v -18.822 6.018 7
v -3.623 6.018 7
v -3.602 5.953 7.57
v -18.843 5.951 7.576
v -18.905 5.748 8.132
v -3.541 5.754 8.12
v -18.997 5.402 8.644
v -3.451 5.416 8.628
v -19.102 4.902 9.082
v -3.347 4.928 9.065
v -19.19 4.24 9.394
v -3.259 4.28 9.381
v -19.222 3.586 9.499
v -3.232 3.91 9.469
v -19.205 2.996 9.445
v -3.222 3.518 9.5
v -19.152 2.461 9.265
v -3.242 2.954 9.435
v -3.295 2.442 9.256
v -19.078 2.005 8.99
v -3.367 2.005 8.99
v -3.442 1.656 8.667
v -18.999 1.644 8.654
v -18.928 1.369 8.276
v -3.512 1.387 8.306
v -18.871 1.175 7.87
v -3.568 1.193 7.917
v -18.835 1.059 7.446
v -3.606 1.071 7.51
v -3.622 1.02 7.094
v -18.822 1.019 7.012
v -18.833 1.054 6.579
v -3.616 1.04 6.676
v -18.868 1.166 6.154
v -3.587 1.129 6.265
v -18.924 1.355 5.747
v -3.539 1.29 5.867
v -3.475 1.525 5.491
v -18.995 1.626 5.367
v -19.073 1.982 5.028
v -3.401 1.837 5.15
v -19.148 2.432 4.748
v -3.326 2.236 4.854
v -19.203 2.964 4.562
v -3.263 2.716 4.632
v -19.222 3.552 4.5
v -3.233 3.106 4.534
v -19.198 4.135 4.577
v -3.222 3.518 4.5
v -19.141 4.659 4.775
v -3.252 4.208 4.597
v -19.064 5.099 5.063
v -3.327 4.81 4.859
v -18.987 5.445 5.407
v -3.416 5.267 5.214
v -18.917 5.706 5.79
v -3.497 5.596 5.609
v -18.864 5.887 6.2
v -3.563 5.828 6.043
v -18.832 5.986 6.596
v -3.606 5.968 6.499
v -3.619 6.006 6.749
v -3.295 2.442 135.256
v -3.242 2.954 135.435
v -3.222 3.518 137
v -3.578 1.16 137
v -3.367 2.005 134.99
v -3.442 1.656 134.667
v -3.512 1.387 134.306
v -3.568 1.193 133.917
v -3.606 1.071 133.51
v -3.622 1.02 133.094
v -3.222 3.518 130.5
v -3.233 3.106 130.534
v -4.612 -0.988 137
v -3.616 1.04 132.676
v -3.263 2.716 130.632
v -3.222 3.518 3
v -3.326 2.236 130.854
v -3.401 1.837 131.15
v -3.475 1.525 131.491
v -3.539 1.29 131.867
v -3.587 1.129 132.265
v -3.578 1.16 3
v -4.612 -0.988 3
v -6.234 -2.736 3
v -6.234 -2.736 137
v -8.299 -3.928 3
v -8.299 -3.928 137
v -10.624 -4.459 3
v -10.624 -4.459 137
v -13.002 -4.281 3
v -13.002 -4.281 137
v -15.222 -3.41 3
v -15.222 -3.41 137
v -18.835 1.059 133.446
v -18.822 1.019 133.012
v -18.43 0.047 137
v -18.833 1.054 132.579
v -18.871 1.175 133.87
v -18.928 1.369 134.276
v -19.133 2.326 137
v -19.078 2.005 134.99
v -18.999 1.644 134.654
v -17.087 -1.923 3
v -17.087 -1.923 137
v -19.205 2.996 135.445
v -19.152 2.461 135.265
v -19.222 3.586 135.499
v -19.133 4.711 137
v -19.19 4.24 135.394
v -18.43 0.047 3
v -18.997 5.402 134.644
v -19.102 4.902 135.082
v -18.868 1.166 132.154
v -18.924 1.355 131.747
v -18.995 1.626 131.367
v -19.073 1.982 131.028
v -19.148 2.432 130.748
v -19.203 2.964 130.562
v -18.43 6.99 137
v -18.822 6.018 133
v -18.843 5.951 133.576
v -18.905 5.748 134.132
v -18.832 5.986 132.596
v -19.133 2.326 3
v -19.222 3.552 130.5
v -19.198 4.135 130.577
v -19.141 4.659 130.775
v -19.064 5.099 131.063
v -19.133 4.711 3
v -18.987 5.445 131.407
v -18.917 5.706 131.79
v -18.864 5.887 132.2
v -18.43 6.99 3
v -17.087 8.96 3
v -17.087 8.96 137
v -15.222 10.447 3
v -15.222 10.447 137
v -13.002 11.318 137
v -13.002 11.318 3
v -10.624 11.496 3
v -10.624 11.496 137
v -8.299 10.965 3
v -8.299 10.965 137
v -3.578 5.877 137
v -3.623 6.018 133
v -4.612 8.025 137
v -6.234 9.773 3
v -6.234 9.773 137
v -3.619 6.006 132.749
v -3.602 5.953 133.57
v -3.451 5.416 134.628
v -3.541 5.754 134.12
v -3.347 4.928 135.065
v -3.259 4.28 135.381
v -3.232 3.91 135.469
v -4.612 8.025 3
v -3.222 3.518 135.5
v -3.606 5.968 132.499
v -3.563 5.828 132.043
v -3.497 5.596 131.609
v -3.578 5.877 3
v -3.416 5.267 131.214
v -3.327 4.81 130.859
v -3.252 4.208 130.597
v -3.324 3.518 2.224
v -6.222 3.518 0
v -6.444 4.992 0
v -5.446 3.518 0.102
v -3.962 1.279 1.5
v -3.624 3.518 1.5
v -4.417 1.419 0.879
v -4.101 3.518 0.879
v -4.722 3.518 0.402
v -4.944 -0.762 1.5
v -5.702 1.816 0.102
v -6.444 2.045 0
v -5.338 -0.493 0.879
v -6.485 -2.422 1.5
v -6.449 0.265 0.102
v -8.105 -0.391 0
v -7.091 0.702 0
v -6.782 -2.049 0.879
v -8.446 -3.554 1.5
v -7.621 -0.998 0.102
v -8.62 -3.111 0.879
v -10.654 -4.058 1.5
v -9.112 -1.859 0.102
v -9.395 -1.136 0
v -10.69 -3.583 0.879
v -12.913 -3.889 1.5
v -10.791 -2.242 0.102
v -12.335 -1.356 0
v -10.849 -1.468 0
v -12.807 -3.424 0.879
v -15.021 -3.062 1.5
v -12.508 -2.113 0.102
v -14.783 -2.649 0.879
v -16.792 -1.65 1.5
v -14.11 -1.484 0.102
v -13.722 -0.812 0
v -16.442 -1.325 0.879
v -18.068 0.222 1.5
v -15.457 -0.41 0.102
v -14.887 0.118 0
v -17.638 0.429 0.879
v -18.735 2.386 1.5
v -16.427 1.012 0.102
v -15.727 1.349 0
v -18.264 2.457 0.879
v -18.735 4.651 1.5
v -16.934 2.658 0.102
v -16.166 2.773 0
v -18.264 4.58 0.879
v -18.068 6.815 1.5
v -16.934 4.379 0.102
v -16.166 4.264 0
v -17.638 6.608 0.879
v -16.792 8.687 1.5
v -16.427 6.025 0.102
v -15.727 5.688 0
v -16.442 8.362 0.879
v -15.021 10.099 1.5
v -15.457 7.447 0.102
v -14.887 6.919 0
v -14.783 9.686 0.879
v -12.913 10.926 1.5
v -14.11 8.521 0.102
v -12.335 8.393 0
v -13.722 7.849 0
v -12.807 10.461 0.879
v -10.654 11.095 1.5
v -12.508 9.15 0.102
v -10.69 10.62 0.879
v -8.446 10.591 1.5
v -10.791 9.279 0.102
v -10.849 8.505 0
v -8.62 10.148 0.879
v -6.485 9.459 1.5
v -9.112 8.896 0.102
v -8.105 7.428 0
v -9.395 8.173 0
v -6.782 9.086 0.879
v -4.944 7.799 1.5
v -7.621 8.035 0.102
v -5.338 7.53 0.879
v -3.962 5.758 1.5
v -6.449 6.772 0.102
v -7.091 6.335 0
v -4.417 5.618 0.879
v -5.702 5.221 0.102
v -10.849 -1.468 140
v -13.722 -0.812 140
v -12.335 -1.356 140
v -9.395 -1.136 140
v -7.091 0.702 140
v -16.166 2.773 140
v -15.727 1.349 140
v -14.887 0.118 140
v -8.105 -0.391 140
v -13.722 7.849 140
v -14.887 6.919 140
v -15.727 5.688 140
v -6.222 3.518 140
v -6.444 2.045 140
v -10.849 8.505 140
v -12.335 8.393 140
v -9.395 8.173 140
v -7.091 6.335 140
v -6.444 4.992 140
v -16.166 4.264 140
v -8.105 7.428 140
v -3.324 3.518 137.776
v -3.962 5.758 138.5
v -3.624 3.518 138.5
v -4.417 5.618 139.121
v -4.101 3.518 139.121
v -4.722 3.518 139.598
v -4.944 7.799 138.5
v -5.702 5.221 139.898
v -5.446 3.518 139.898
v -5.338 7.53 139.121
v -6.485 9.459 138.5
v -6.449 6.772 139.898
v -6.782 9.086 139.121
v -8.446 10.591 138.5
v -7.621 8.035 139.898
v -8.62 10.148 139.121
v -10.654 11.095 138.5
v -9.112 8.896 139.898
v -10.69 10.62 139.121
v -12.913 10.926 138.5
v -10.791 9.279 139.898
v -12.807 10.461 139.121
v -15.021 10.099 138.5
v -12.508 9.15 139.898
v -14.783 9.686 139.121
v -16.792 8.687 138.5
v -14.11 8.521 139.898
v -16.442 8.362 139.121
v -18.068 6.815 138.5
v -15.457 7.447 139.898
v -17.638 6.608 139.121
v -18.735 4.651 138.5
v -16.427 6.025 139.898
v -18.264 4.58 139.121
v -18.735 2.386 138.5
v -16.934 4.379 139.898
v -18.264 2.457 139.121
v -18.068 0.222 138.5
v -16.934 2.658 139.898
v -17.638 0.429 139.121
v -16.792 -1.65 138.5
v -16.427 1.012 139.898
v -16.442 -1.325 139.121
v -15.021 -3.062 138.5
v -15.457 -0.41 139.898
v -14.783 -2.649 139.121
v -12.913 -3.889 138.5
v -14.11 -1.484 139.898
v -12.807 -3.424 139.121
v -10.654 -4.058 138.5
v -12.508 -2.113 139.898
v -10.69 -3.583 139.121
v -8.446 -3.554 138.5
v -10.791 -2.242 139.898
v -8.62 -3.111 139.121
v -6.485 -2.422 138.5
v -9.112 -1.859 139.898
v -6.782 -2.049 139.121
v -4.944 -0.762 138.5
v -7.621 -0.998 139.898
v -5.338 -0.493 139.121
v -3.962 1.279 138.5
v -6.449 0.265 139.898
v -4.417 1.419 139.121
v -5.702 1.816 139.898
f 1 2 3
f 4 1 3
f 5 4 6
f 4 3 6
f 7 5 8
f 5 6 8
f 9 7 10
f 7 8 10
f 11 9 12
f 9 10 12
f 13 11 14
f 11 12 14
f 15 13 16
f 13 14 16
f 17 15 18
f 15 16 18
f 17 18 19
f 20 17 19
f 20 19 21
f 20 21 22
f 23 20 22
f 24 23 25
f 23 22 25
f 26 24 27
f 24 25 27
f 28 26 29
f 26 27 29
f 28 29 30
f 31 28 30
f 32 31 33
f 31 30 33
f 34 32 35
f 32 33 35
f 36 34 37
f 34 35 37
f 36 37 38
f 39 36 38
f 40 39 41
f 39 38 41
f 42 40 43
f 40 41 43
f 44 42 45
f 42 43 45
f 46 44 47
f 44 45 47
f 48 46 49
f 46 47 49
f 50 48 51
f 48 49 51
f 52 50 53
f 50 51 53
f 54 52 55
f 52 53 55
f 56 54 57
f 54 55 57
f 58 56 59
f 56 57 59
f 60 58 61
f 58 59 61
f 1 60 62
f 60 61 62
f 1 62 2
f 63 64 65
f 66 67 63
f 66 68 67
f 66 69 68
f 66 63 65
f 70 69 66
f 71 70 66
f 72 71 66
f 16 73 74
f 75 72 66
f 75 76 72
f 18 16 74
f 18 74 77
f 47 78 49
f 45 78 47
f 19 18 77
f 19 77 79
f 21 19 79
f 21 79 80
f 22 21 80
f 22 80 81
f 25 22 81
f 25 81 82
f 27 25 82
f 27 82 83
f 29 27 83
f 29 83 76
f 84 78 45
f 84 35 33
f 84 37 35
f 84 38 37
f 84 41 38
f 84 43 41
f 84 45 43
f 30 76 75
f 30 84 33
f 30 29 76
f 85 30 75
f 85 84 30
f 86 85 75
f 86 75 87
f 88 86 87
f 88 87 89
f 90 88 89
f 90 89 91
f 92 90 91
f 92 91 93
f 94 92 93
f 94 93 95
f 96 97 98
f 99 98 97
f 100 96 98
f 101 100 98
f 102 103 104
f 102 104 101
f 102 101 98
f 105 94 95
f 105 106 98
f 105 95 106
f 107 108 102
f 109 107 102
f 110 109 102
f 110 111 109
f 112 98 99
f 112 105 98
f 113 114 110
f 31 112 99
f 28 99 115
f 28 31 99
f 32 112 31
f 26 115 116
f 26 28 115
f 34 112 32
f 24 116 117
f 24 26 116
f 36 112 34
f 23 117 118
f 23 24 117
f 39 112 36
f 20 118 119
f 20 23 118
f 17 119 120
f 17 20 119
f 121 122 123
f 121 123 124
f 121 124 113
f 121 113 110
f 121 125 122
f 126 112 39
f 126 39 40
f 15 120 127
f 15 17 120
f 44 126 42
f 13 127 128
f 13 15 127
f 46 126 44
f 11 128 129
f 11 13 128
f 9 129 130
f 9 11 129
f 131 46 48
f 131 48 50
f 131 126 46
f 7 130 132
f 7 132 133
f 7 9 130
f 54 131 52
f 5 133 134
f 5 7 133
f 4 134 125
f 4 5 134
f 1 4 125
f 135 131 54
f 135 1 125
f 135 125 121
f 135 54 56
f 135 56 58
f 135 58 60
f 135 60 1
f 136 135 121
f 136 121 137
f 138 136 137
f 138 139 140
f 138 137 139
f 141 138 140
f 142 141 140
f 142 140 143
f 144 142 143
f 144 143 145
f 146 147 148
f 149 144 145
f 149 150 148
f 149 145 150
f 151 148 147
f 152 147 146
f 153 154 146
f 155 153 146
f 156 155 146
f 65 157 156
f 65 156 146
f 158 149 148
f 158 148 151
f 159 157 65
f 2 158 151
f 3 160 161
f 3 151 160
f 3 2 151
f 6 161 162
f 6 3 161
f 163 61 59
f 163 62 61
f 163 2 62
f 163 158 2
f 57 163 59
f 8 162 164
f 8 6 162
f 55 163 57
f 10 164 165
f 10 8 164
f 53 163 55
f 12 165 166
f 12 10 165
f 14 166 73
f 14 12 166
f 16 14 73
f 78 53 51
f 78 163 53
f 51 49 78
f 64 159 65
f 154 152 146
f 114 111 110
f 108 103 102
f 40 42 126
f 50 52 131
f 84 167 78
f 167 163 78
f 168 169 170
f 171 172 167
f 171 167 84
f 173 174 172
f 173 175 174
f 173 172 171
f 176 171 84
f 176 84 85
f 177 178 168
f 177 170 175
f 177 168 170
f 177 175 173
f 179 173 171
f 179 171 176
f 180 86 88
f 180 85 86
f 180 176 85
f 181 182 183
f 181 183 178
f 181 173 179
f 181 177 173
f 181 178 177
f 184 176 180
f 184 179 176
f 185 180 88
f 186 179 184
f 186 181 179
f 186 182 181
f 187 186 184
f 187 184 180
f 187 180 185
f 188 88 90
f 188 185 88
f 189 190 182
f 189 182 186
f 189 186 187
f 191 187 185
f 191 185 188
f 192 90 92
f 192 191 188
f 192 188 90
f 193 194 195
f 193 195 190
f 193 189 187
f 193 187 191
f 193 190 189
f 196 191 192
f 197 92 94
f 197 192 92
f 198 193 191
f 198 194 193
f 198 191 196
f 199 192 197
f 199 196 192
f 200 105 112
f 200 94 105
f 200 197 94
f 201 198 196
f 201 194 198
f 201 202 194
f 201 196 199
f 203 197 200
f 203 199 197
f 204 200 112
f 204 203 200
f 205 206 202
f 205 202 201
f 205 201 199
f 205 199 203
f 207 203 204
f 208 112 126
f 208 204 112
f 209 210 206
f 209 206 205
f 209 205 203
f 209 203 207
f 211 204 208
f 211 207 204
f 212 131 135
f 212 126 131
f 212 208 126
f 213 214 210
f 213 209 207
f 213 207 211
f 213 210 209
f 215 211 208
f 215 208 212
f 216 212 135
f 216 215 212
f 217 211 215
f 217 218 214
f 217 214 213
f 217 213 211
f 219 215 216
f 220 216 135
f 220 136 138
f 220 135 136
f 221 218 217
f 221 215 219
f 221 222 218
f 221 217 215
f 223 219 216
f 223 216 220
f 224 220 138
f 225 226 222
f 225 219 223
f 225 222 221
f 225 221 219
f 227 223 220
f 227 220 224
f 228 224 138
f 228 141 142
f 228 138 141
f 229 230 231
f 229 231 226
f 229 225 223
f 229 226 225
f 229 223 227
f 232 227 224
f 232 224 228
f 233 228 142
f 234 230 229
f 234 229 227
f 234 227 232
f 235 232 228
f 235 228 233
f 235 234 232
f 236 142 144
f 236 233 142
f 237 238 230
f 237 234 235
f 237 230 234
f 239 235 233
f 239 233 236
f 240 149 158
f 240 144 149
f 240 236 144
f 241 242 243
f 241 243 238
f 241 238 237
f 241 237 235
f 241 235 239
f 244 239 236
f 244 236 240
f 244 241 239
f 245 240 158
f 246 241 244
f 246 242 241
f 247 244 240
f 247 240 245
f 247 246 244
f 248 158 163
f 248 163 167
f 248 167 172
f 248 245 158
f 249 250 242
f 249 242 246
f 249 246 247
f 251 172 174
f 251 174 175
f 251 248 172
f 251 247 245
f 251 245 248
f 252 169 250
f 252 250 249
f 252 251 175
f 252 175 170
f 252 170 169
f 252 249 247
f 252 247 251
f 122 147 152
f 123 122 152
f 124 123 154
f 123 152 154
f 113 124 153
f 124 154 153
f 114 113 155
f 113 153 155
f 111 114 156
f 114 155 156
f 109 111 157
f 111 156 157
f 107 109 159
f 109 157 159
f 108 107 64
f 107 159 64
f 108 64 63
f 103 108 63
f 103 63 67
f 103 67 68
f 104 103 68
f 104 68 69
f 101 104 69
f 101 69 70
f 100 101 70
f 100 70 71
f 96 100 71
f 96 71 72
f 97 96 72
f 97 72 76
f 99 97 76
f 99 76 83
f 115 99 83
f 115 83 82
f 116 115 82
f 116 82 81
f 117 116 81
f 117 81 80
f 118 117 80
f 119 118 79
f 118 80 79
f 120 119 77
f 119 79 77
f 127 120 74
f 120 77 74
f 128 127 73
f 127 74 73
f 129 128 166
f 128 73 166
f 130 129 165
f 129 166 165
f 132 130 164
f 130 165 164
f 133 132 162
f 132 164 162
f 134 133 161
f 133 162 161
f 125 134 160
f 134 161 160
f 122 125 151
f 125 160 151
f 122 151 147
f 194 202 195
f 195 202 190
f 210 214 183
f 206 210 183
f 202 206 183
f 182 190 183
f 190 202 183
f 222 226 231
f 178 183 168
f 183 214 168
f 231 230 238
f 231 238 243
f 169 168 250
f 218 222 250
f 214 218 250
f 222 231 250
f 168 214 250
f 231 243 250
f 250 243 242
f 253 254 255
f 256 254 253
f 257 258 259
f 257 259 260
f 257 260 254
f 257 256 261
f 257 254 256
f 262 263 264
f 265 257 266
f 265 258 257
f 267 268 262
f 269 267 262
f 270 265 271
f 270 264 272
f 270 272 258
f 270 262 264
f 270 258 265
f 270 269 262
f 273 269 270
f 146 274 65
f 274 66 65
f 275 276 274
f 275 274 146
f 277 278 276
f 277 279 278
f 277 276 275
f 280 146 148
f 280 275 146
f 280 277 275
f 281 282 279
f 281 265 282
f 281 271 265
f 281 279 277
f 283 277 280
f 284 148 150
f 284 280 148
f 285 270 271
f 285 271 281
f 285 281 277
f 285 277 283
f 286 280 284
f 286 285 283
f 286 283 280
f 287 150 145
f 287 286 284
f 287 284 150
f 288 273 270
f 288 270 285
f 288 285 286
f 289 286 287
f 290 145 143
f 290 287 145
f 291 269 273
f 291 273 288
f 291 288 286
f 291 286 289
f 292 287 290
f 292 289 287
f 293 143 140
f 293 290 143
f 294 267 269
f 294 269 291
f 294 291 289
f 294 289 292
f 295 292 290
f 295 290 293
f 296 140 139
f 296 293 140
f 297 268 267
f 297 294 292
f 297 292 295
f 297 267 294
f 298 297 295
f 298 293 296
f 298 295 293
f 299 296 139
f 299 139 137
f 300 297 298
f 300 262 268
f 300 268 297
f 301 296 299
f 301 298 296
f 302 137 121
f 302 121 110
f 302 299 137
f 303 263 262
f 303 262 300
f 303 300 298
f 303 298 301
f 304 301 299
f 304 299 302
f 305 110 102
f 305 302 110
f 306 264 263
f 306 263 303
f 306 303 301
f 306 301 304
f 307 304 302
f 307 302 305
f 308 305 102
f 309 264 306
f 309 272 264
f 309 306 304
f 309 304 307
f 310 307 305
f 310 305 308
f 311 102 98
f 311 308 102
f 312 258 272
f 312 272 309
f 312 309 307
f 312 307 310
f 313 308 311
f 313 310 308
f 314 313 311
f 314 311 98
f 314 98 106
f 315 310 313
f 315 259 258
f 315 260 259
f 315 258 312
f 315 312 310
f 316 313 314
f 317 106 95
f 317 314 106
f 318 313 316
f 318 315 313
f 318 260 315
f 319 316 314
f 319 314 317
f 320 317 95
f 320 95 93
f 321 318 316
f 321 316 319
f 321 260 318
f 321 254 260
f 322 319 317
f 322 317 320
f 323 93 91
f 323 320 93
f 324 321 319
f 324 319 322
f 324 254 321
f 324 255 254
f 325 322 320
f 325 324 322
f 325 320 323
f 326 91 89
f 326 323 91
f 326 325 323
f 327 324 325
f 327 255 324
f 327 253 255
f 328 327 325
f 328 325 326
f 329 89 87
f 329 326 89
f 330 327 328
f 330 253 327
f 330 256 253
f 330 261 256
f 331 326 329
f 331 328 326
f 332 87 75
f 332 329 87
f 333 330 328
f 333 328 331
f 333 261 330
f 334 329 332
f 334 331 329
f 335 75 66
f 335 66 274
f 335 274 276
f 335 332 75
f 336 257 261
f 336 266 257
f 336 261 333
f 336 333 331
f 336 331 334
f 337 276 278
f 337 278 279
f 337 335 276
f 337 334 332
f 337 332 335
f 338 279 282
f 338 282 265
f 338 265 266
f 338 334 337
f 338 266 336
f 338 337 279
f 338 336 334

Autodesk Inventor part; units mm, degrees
ref_plane "YZ Plane" through (0, 0, 0) normal (1, 0, 0) x (0, 1, 0)
ref_plane "XZ Plane" through (0, 0, 0) normal (0, 1, 0) x (-1, 0, 0)
ref_plane "XY Plane" through (0, 0, 0) normal (0, 0, 1) x (1, 0, 0)
sketch "Sketch1" plane through (0, 0, 0) normal (0, 0, 1) x (1, 0, 0)
  circle A0 centre (-11.2222, 3.5185) radius 8
  point P0 (0, 0)
  dimension "d0" = 16
extrude "Extrusion1" add sketch "Sketch1" along normal blind 140
fillet "Fillet1" radius 3 2 edges at (-19.2222, 3.5185, 140) (-19.2222, 3.5185, 0)
sketch "Sketch2" plane through (0, 0, 0) normal (1, 0, 0) x (0, 1, 0)
  line L0 (-1.4815, 140) -> (8.5185, 140) projected
  line L1 (3.5185, 140) -> (3.5185, 40)
  circle A0 centre (3.5185, 133) radius 2.5
  circle A1 centre (3.5185, 7) radius 2.5
  line L2 (8.5185, 0) -> (-1.4815, 0) projected
  point P0 (0, 0)
  dimension "d4" = 5
  dimension "d5" = 5
  dimension "d6" = 7
  dimension "d10" = 7
extrude "Extrusion2" cut sketch "Sketch2" against normal blind 100
properties part number "Eixo_16mm" material "SAE 1010/1020"
